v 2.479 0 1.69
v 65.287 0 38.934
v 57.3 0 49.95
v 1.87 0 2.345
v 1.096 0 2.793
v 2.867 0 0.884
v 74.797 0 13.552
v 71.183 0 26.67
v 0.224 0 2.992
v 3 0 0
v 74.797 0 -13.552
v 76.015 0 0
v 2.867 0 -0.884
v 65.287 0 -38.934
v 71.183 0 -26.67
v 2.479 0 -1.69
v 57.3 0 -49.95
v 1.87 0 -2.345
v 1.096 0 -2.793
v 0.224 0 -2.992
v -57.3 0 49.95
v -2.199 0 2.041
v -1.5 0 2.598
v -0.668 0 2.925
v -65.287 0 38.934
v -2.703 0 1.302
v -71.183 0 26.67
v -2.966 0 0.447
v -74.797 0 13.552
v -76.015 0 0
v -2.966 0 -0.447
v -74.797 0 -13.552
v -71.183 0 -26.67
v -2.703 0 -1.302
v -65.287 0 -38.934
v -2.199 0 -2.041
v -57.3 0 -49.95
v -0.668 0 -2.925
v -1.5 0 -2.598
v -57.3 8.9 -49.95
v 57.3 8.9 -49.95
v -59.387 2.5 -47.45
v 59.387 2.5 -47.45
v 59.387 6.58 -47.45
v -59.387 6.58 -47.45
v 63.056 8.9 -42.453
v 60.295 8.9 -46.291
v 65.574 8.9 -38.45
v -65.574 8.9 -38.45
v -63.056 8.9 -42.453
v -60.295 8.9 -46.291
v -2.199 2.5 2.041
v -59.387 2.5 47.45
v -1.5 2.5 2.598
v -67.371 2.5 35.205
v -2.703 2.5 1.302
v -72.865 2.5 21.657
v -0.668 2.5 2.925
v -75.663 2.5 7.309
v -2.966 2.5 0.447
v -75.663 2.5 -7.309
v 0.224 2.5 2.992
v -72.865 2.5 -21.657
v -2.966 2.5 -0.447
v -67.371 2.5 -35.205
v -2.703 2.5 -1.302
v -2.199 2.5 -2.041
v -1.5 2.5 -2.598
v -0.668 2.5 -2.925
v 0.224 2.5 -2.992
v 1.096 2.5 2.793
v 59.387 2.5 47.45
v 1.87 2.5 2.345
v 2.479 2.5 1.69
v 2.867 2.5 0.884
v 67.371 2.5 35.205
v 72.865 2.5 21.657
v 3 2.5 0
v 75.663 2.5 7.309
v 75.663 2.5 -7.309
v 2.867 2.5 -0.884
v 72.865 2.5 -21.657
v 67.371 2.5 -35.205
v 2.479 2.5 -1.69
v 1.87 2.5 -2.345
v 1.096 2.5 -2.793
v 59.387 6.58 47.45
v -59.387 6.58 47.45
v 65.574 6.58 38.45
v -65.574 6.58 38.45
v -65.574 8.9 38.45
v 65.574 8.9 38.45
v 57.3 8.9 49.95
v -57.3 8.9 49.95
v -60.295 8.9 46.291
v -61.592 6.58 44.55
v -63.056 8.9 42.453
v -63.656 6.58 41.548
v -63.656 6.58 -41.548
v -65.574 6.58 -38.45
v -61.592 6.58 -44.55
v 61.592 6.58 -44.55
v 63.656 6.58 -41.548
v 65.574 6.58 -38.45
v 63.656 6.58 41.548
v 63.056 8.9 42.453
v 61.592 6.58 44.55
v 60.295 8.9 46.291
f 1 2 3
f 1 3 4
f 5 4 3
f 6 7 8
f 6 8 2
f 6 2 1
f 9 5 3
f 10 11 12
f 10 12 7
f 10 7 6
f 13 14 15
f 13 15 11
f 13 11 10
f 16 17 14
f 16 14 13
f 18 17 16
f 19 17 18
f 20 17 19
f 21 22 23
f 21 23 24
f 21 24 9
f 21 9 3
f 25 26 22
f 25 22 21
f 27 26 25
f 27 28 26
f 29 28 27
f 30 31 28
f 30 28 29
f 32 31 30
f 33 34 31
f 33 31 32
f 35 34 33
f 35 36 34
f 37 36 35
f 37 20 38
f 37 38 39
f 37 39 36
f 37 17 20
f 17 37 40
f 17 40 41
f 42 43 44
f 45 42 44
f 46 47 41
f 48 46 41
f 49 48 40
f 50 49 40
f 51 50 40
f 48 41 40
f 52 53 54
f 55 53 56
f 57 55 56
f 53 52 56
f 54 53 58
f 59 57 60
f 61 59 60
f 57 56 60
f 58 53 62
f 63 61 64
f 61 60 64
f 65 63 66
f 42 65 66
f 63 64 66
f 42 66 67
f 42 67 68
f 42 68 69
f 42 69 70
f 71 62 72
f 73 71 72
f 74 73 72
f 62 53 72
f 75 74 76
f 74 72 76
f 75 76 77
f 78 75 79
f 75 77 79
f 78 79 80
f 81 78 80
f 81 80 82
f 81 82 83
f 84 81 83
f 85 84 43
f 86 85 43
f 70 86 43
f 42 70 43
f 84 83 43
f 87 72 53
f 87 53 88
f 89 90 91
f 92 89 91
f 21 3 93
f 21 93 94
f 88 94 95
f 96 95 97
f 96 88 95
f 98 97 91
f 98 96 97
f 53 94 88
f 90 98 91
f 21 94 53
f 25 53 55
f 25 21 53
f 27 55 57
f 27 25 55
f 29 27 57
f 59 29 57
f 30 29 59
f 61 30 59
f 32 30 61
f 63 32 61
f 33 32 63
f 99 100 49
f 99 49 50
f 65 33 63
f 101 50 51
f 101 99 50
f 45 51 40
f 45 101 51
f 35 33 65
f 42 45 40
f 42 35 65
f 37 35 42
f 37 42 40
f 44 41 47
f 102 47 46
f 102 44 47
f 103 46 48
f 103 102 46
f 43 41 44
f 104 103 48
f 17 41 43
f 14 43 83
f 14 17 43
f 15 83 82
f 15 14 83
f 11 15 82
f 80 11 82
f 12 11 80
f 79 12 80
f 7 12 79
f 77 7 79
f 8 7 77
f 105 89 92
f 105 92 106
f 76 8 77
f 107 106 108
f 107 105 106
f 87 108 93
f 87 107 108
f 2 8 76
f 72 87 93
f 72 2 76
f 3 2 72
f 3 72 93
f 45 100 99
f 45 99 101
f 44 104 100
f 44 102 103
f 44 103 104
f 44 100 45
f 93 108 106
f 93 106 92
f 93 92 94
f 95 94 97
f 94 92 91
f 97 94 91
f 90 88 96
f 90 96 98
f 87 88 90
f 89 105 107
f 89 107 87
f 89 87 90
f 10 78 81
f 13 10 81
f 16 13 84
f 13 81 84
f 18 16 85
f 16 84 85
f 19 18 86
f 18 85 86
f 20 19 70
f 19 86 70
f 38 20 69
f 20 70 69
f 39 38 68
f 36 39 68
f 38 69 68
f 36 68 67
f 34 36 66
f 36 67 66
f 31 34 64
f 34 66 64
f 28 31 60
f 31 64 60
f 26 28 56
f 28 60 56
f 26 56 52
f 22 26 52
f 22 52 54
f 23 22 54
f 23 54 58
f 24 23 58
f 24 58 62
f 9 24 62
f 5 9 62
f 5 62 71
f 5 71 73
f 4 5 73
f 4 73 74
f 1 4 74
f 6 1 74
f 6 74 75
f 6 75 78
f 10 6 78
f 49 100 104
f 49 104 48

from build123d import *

# Parameters (mm, degrees)
BOSS_EXTRUDE1_DEPTH     = 8.9
SKETCH4_W               = 94.9
SKETCH4_H               = 4.080124435
CUT_EXTRUDE1_DEPTH      = 77.015080741
CUT_EXTRUDE1_DEPTH_BACK = 77.015080741
SKETCH7_W               = 76.9
SKETCH7_H               = 2.319875565
CUT_EXTRUDE2_DEPTH      = 77.015080741
CUT_EXTRUDE2_DEPTH_BACK = 77.015080741
SKETCH8_R               = 3
CUT_EXTRUDE3_DEPTH      = 7.4
CUT_EXTRUDE3_DEPTH_BACK = 3.5


with BuildPart() as part:
    # Sketch3 → Boss-Extrude1 (new body)
    with BuildSketch(Plane(origin=(0, 0, 0), x_dir=(1, 0, 0), z_dir=(0, 1, 0))):
        with BuildLine():
            Line((-57.3, 49.95), (57.3, 49.95))
            ThreePointArc((57.3, 49.95), (76.015080741, 0), (57.3, -49.95))
            Line((57.3, -49.95), (-57.3, -49.95))
            ThreePointArc((-57.3, -49.95), (-76.015080741, 0), (-57.3, 49.95))
        make_face()
    extrude(amount=BOSS_EXTRUDE1_DEPTH)

    # Sketch4 → Cut-Extrude1 (cut, two sides)
    with BuildSketch(Plane(origin=(0, 0, 0), x_dir=(0, 0, -1), z_dir=(1, 0, 0))) as cut_extrude1_sk:
        with Locations((0, 4.540062218)):
            Rectangle(SKETCH4_W, SKETCH4_H)
    extrude(amount=CUT_EXTRUDE1_DEPTH, mode=Mode.SUBTRACT)
    extrude(cut_extrude1_sk.sketch, amount=-CUT_EXTRUDE1_DEPTH_BACK, mode=Mode.SUBTRACT)

    # Sketch7 → Cut-Extrude2 (cut, two sides)
    with BuildSketch(Plane(origin=(0, 0, 0), x_dir=(0, 0, -1), z_dir=(1, 0, 0))) as cut_extrude2_sk:
        with Locations((0, 7.740062218)):
            Rectangle(SKETCH7_W, SKETCH7_H)
    extrude(amount=CUT_EXTRUDE2_DEPTH, mode=Mode.SUBTRACT)
    extrude(cut_extrude2_sk.sketch, amount=-CUT_EXTRUDE2_DEPTH_BACK, mode=Mode.SUBTRACT)

    # Sketch8 → Cut-Extrude3 (cut, two sides)
    with BuildSketch(Plane(origin=(0, 2.5, 0), x_dir=(1, 0, 0), z_dir=(0, 1, 0))) as cut_extrude3_sk:
        Circle(SKETCH8_R)
    extrude(amount=CUT_EXTRUDE3_DEPTH, mode=Mode.SUBTRACT)
    extrude(cut_extrude3_sk.sketch, amount=-CUT_EXTRUDE3_DEPTH_BACK, mode=Mode.SUBTRACT)


solid = part.part
